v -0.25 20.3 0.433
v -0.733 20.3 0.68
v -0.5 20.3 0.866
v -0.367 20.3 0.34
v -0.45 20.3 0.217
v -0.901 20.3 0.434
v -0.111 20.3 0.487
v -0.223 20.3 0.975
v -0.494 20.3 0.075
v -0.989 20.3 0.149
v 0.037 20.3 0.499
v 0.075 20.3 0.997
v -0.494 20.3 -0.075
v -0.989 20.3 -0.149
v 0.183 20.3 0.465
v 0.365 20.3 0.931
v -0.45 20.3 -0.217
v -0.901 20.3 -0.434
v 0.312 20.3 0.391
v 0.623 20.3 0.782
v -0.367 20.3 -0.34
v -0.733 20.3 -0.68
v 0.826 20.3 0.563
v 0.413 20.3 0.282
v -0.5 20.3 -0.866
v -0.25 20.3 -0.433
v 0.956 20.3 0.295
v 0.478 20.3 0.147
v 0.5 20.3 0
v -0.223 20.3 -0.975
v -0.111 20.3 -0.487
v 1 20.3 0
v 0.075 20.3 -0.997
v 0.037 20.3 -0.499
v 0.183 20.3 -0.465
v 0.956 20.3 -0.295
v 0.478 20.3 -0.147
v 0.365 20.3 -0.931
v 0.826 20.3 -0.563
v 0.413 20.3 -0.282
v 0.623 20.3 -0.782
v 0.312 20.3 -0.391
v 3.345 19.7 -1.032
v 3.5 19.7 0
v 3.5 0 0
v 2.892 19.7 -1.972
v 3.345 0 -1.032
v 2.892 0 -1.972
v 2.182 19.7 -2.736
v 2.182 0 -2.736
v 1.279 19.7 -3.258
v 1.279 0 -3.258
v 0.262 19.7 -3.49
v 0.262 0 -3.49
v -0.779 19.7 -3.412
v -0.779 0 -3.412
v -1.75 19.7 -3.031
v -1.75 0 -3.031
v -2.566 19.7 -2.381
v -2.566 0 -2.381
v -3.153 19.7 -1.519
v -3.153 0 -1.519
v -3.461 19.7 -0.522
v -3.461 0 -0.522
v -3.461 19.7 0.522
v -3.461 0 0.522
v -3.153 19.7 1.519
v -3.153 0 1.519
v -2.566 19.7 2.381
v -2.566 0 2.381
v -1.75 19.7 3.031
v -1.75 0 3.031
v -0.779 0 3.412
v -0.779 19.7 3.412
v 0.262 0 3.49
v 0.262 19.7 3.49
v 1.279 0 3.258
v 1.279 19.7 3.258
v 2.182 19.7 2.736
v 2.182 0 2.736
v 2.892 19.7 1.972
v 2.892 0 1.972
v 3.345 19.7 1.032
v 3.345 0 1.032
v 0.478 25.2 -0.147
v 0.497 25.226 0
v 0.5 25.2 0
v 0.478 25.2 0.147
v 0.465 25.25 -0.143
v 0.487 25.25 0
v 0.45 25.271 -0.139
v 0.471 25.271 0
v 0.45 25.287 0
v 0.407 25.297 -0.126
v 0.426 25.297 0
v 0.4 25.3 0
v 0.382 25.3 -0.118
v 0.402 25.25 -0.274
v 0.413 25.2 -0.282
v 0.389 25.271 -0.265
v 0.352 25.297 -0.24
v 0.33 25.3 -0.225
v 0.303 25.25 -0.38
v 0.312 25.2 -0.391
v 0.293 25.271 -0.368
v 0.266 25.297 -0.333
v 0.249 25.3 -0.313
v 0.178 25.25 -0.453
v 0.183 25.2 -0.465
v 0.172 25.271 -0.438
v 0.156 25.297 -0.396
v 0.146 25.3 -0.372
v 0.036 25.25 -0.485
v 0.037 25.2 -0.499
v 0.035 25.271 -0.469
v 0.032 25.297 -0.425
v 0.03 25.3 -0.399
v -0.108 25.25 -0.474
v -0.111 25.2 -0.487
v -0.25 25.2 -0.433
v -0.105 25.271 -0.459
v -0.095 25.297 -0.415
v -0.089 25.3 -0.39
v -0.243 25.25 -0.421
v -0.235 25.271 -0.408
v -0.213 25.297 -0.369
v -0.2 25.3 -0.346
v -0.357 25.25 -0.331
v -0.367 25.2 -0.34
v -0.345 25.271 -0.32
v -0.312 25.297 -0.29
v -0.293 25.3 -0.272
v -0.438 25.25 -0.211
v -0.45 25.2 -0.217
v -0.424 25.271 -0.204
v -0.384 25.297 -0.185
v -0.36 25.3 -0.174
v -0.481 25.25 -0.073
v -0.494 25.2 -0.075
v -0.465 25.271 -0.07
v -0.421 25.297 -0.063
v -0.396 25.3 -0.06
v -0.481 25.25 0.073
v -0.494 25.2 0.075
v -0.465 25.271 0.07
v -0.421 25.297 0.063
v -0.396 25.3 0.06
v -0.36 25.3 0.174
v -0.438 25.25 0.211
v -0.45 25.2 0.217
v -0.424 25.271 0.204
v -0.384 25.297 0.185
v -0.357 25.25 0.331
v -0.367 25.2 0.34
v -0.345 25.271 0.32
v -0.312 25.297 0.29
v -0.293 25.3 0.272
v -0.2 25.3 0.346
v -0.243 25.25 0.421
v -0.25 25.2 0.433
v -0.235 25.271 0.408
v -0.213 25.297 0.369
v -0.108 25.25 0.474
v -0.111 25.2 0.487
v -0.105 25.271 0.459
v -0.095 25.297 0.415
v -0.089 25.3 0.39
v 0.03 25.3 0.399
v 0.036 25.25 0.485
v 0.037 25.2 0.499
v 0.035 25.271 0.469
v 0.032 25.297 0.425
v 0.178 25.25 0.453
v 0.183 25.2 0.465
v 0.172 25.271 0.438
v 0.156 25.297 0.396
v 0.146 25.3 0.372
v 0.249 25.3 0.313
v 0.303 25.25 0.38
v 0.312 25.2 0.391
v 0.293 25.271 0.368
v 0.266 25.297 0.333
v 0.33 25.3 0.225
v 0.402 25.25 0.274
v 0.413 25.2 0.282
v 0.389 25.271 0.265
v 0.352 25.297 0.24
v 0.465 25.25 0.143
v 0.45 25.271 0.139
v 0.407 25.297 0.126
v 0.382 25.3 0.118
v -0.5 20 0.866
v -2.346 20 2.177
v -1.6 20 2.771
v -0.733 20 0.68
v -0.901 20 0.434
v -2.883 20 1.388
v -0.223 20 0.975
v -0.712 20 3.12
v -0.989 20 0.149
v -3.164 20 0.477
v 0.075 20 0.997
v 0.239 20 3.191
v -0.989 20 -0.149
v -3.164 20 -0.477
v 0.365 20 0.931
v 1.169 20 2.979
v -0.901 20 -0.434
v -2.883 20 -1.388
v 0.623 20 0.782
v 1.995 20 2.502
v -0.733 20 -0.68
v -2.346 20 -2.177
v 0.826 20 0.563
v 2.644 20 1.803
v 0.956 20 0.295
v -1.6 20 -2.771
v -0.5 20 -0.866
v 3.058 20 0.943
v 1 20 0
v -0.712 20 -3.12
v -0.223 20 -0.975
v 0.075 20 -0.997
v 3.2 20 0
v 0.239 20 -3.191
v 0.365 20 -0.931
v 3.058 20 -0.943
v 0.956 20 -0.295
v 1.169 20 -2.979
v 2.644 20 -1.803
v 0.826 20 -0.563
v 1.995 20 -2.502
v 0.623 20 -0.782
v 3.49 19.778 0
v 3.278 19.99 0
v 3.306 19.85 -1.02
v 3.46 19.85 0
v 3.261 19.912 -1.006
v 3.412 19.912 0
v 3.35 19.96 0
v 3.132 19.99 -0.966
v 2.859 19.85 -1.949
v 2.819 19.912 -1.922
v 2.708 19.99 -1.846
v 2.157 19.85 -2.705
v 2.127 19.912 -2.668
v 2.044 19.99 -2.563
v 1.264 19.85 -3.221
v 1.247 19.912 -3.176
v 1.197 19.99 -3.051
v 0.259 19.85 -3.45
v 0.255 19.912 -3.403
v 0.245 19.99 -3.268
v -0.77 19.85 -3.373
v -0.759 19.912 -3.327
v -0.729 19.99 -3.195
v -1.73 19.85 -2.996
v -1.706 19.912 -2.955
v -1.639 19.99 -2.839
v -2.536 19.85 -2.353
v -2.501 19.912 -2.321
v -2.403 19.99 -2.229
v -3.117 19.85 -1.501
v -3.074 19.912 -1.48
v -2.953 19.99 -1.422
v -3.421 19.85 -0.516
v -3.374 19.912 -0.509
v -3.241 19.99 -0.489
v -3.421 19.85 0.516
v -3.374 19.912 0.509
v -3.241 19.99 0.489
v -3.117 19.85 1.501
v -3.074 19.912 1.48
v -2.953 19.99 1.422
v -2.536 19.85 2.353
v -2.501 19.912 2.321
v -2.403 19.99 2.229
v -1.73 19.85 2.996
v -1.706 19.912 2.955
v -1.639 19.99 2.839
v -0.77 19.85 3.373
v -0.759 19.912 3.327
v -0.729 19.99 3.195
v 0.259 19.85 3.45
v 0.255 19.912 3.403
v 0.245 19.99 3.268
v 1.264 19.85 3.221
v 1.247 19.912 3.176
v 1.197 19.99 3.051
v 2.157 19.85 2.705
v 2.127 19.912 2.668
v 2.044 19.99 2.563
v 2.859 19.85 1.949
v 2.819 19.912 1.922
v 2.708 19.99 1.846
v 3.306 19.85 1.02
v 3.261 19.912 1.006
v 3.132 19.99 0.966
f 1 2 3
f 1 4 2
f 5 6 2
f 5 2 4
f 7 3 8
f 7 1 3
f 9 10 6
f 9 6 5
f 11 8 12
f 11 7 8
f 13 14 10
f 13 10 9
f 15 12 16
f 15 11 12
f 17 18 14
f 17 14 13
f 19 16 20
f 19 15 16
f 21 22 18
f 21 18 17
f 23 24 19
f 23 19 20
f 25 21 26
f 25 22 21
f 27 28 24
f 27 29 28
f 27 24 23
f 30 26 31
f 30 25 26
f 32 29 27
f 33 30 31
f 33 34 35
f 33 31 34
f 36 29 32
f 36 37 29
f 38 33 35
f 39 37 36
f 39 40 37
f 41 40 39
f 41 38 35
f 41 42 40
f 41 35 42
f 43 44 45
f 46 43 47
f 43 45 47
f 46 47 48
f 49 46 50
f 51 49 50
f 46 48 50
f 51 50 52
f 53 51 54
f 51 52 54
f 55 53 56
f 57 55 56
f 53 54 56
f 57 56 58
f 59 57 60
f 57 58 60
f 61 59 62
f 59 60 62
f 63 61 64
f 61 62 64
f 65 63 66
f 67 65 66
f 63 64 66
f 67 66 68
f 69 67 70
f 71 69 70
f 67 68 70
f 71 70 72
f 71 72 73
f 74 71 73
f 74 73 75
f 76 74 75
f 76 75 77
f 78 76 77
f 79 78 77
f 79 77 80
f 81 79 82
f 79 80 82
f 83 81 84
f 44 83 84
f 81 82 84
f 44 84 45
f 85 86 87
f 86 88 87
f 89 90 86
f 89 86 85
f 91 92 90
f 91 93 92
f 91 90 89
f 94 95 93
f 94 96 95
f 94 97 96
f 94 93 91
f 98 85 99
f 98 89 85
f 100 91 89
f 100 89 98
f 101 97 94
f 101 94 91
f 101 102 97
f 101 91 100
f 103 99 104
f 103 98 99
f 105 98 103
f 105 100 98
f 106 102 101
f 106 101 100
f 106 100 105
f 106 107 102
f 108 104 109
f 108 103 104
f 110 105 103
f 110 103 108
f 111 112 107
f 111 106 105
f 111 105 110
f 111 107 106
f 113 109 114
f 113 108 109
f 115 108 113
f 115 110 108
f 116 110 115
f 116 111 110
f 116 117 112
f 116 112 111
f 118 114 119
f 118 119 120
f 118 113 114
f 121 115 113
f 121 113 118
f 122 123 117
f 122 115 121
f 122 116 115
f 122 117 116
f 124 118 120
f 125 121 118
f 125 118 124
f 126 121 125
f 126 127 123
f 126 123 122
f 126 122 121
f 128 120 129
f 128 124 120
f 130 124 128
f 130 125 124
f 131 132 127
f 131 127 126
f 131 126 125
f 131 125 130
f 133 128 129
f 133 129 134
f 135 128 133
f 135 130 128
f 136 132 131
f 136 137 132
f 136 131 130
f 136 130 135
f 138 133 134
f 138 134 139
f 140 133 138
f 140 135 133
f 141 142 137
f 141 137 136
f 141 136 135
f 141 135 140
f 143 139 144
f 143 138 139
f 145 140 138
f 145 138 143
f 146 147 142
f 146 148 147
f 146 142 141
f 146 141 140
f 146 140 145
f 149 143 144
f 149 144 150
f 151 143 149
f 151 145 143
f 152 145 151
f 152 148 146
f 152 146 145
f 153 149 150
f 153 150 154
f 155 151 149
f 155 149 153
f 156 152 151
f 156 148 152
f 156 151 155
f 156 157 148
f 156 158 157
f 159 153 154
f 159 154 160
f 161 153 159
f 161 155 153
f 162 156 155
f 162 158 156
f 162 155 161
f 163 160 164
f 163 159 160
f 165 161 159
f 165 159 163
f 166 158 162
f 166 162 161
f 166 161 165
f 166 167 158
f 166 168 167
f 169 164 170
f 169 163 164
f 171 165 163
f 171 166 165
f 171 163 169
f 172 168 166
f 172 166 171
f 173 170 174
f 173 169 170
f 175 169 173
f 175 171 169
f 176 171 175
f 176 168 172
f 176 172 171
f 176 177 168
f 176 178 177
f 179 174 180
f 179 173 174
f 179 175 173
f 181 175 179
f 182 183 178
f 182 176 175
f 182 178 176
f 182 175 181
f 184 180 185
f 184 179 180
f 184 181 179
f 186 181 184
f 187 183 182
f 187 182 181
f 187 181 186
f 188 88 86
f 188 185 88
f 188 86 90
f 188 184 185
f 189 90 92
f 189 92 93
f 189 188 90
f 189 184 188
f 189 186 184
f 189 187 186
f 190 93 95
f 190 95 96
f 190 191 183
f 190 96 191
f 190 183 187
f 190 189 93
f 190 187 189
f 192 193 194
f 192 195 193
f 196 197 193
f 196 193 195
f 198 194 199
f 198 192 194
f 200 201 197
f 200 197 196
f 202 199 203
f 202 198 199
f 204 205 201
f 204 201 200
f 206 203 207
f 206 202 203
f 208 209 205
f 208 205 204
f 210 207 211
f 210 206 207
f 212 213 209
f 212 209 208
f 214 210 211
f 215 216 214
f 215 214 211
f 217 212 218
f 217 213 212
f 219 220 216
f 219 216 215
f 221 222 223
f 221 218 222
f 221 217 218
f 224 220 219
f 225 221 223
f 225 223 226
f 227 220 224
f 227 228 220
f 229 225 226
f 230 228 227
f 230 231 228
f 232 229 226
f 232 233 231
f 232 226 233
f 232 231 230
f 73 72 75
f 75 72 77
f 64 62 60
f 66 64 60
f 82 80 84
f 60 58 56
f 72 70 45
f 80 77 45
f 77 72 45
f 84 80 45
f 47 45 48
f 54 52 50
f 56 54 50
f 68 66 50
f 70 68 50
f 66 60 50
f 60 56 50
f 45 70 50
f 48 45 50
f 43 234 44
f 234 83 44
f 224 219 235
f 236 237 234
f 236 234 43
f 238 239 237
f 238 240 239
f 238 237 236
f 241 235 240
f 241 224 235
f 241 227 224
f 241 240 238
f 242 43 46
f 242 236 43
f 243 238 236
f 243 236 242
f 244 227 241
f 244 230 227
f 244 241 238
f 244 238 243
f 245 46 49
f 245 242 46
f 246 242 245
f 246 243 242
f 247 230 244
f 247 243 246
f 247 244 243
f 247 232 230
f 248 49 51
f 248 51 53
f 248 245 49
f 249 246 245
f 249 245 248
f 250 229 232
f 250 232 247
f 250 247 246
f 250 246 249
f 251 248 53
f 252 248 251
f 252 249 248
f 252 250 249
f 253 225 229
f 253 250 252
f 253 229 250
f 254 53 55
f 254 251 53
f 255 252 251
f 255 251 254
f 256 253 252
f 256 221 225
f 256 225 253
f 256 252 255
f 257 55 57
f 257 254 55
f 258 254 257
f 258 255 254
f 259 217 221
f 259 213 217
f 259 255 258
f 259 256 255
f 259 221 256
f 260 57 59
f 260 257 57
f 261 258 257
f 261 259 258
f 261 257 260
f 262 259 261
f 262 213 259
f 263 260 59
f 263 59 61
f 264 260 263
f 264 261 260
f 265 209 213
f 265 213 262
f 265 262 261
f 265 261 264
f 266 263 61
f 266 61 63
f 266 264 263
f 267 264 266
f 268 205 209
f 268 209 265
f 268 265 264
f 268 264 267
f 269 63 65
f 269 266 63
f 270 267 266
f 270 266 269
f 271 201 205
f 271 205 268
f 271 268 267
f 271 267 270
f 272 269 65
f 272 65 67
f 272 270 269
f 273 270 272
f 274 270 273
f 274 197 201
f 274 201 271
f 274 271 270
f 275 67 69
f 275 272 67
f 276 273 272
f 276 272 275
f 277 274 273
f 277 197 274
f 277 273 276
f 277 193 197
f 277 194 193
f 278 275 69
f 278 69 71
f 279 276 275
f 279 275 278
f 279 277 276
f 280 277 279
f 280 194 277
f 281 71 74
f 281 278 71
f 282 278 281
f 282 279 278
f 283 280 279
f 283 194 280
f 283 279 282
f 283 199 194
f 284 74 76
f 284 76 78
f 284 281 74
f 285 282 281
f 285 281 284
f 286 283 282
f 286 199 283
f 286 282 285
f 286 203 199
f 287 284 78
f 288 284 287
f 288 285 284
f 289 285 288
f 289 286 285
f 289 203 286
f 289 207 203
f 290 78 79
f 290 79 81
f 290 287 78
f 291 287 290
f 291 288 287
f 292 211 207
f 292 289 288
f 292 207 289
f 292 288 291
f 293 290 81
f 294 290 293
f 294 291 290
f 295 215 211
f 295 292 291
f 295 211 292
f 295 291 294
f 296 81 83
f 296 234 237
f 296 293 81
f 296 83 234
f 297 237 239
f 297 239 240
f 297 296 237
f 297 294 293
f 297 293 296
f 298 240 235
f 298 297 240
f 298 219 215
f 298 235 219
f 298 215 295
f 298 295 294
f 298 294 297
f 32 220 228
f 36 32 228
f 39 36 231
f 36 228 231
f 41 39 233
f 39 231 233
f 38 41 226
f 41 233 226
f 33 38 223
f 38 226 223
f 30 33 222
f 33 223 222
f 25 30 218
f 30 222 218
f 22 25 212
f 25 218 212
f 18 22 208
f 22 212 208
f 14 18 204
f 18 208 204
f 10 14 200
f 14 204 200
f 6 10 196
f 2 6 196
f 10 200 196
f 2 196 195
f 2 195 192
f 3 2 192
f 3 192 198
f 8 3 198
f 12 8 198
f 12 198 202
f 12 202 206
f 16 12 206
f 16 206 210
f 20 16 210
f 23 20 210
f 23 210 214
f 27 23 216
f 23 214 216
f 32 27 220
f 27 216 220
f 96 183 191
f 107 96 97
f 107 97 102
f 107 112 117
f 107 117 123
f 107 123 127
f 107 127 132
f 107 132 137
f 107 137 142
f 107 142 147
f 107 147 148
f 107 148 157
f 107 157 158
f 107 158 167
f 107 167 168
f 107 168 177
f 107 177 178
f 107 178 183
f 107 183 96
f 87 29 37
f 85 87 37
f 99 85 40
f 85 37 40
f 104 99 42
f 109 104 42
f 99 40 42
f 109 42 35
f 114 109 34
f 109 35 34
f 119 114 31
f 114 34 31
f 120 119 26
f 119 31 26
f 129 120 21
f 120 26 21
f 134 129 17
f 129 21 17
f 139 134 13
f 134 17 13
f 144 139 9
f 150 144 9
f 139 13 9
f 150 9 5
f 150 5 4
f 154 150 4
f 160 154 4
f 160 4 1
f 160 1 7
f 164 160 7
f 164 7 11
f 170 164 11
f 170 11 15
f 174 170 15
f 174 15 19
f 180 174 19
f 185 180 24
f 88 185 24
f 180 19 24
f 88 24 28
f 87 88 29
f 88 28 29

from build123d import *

# Parameters (mm, degrees)
SKETCH1_R           = 3.5
BOSS_EXTRUDE1_DEPTH = 20
FILLET1_R           = 0.3
SKETCH2_R           = 1
BOSS_EXTRUDE2_DEPTH = 0.3
SKETCH3_R           = 0.5
BOSS_EXTRUDE3_DEPTH = 5
FILLET2_R           = 0.1


with BuildPart() as part:
    # Sketch1 → Boss-Extrude1 (new body)
    with BuildSketch(Plane(origin=(0, 0, 0), x_dir=(1, 0, 0), z_dir=(0, 1, 0))):
        Circle(SKETCH1_R)
    extrude(amount=BOSS_EXTRUDE1_DEPTH)

    # Fillet1
    fillet1_edges = [part.edges().sort_by_distance(p)[0] for p in [
        (-3.5, 20, 0),
    ]]
    fillet(fillet1_edges, radius=FILLET1_R)

    # Sketch2 → Boss-Extrude2 (add)
    with BuildSketch(Plane(origin=(0, 20, 0), x_dir=(1, 0, 0), z_dir=(0, 1, 0))):
        Circle(SKETCH2_R)
    extrude(amount=BOSS_EXTRUDE2_DEPTH)

    # Sketch3 → Boss-Extrude3 (add)
    with BuildSketch(Plane(origin=(0, 20.3, 0), x_dir=(1, 0, 0), z_dir=(0, 1, 0))):
        Circle(SKETCH3_R)
    extrude(amount=BOSS_EXTRUDE3_DEPTH)

    # Fillet2
    fillet2_edges = [part.edges().sort_by_distance(p)[0] for p in [
        (-0.5, 25.3, 0),
    ]]
    fillet(fillet2_edges, radius=FILLET2_R)


solid = part.part
